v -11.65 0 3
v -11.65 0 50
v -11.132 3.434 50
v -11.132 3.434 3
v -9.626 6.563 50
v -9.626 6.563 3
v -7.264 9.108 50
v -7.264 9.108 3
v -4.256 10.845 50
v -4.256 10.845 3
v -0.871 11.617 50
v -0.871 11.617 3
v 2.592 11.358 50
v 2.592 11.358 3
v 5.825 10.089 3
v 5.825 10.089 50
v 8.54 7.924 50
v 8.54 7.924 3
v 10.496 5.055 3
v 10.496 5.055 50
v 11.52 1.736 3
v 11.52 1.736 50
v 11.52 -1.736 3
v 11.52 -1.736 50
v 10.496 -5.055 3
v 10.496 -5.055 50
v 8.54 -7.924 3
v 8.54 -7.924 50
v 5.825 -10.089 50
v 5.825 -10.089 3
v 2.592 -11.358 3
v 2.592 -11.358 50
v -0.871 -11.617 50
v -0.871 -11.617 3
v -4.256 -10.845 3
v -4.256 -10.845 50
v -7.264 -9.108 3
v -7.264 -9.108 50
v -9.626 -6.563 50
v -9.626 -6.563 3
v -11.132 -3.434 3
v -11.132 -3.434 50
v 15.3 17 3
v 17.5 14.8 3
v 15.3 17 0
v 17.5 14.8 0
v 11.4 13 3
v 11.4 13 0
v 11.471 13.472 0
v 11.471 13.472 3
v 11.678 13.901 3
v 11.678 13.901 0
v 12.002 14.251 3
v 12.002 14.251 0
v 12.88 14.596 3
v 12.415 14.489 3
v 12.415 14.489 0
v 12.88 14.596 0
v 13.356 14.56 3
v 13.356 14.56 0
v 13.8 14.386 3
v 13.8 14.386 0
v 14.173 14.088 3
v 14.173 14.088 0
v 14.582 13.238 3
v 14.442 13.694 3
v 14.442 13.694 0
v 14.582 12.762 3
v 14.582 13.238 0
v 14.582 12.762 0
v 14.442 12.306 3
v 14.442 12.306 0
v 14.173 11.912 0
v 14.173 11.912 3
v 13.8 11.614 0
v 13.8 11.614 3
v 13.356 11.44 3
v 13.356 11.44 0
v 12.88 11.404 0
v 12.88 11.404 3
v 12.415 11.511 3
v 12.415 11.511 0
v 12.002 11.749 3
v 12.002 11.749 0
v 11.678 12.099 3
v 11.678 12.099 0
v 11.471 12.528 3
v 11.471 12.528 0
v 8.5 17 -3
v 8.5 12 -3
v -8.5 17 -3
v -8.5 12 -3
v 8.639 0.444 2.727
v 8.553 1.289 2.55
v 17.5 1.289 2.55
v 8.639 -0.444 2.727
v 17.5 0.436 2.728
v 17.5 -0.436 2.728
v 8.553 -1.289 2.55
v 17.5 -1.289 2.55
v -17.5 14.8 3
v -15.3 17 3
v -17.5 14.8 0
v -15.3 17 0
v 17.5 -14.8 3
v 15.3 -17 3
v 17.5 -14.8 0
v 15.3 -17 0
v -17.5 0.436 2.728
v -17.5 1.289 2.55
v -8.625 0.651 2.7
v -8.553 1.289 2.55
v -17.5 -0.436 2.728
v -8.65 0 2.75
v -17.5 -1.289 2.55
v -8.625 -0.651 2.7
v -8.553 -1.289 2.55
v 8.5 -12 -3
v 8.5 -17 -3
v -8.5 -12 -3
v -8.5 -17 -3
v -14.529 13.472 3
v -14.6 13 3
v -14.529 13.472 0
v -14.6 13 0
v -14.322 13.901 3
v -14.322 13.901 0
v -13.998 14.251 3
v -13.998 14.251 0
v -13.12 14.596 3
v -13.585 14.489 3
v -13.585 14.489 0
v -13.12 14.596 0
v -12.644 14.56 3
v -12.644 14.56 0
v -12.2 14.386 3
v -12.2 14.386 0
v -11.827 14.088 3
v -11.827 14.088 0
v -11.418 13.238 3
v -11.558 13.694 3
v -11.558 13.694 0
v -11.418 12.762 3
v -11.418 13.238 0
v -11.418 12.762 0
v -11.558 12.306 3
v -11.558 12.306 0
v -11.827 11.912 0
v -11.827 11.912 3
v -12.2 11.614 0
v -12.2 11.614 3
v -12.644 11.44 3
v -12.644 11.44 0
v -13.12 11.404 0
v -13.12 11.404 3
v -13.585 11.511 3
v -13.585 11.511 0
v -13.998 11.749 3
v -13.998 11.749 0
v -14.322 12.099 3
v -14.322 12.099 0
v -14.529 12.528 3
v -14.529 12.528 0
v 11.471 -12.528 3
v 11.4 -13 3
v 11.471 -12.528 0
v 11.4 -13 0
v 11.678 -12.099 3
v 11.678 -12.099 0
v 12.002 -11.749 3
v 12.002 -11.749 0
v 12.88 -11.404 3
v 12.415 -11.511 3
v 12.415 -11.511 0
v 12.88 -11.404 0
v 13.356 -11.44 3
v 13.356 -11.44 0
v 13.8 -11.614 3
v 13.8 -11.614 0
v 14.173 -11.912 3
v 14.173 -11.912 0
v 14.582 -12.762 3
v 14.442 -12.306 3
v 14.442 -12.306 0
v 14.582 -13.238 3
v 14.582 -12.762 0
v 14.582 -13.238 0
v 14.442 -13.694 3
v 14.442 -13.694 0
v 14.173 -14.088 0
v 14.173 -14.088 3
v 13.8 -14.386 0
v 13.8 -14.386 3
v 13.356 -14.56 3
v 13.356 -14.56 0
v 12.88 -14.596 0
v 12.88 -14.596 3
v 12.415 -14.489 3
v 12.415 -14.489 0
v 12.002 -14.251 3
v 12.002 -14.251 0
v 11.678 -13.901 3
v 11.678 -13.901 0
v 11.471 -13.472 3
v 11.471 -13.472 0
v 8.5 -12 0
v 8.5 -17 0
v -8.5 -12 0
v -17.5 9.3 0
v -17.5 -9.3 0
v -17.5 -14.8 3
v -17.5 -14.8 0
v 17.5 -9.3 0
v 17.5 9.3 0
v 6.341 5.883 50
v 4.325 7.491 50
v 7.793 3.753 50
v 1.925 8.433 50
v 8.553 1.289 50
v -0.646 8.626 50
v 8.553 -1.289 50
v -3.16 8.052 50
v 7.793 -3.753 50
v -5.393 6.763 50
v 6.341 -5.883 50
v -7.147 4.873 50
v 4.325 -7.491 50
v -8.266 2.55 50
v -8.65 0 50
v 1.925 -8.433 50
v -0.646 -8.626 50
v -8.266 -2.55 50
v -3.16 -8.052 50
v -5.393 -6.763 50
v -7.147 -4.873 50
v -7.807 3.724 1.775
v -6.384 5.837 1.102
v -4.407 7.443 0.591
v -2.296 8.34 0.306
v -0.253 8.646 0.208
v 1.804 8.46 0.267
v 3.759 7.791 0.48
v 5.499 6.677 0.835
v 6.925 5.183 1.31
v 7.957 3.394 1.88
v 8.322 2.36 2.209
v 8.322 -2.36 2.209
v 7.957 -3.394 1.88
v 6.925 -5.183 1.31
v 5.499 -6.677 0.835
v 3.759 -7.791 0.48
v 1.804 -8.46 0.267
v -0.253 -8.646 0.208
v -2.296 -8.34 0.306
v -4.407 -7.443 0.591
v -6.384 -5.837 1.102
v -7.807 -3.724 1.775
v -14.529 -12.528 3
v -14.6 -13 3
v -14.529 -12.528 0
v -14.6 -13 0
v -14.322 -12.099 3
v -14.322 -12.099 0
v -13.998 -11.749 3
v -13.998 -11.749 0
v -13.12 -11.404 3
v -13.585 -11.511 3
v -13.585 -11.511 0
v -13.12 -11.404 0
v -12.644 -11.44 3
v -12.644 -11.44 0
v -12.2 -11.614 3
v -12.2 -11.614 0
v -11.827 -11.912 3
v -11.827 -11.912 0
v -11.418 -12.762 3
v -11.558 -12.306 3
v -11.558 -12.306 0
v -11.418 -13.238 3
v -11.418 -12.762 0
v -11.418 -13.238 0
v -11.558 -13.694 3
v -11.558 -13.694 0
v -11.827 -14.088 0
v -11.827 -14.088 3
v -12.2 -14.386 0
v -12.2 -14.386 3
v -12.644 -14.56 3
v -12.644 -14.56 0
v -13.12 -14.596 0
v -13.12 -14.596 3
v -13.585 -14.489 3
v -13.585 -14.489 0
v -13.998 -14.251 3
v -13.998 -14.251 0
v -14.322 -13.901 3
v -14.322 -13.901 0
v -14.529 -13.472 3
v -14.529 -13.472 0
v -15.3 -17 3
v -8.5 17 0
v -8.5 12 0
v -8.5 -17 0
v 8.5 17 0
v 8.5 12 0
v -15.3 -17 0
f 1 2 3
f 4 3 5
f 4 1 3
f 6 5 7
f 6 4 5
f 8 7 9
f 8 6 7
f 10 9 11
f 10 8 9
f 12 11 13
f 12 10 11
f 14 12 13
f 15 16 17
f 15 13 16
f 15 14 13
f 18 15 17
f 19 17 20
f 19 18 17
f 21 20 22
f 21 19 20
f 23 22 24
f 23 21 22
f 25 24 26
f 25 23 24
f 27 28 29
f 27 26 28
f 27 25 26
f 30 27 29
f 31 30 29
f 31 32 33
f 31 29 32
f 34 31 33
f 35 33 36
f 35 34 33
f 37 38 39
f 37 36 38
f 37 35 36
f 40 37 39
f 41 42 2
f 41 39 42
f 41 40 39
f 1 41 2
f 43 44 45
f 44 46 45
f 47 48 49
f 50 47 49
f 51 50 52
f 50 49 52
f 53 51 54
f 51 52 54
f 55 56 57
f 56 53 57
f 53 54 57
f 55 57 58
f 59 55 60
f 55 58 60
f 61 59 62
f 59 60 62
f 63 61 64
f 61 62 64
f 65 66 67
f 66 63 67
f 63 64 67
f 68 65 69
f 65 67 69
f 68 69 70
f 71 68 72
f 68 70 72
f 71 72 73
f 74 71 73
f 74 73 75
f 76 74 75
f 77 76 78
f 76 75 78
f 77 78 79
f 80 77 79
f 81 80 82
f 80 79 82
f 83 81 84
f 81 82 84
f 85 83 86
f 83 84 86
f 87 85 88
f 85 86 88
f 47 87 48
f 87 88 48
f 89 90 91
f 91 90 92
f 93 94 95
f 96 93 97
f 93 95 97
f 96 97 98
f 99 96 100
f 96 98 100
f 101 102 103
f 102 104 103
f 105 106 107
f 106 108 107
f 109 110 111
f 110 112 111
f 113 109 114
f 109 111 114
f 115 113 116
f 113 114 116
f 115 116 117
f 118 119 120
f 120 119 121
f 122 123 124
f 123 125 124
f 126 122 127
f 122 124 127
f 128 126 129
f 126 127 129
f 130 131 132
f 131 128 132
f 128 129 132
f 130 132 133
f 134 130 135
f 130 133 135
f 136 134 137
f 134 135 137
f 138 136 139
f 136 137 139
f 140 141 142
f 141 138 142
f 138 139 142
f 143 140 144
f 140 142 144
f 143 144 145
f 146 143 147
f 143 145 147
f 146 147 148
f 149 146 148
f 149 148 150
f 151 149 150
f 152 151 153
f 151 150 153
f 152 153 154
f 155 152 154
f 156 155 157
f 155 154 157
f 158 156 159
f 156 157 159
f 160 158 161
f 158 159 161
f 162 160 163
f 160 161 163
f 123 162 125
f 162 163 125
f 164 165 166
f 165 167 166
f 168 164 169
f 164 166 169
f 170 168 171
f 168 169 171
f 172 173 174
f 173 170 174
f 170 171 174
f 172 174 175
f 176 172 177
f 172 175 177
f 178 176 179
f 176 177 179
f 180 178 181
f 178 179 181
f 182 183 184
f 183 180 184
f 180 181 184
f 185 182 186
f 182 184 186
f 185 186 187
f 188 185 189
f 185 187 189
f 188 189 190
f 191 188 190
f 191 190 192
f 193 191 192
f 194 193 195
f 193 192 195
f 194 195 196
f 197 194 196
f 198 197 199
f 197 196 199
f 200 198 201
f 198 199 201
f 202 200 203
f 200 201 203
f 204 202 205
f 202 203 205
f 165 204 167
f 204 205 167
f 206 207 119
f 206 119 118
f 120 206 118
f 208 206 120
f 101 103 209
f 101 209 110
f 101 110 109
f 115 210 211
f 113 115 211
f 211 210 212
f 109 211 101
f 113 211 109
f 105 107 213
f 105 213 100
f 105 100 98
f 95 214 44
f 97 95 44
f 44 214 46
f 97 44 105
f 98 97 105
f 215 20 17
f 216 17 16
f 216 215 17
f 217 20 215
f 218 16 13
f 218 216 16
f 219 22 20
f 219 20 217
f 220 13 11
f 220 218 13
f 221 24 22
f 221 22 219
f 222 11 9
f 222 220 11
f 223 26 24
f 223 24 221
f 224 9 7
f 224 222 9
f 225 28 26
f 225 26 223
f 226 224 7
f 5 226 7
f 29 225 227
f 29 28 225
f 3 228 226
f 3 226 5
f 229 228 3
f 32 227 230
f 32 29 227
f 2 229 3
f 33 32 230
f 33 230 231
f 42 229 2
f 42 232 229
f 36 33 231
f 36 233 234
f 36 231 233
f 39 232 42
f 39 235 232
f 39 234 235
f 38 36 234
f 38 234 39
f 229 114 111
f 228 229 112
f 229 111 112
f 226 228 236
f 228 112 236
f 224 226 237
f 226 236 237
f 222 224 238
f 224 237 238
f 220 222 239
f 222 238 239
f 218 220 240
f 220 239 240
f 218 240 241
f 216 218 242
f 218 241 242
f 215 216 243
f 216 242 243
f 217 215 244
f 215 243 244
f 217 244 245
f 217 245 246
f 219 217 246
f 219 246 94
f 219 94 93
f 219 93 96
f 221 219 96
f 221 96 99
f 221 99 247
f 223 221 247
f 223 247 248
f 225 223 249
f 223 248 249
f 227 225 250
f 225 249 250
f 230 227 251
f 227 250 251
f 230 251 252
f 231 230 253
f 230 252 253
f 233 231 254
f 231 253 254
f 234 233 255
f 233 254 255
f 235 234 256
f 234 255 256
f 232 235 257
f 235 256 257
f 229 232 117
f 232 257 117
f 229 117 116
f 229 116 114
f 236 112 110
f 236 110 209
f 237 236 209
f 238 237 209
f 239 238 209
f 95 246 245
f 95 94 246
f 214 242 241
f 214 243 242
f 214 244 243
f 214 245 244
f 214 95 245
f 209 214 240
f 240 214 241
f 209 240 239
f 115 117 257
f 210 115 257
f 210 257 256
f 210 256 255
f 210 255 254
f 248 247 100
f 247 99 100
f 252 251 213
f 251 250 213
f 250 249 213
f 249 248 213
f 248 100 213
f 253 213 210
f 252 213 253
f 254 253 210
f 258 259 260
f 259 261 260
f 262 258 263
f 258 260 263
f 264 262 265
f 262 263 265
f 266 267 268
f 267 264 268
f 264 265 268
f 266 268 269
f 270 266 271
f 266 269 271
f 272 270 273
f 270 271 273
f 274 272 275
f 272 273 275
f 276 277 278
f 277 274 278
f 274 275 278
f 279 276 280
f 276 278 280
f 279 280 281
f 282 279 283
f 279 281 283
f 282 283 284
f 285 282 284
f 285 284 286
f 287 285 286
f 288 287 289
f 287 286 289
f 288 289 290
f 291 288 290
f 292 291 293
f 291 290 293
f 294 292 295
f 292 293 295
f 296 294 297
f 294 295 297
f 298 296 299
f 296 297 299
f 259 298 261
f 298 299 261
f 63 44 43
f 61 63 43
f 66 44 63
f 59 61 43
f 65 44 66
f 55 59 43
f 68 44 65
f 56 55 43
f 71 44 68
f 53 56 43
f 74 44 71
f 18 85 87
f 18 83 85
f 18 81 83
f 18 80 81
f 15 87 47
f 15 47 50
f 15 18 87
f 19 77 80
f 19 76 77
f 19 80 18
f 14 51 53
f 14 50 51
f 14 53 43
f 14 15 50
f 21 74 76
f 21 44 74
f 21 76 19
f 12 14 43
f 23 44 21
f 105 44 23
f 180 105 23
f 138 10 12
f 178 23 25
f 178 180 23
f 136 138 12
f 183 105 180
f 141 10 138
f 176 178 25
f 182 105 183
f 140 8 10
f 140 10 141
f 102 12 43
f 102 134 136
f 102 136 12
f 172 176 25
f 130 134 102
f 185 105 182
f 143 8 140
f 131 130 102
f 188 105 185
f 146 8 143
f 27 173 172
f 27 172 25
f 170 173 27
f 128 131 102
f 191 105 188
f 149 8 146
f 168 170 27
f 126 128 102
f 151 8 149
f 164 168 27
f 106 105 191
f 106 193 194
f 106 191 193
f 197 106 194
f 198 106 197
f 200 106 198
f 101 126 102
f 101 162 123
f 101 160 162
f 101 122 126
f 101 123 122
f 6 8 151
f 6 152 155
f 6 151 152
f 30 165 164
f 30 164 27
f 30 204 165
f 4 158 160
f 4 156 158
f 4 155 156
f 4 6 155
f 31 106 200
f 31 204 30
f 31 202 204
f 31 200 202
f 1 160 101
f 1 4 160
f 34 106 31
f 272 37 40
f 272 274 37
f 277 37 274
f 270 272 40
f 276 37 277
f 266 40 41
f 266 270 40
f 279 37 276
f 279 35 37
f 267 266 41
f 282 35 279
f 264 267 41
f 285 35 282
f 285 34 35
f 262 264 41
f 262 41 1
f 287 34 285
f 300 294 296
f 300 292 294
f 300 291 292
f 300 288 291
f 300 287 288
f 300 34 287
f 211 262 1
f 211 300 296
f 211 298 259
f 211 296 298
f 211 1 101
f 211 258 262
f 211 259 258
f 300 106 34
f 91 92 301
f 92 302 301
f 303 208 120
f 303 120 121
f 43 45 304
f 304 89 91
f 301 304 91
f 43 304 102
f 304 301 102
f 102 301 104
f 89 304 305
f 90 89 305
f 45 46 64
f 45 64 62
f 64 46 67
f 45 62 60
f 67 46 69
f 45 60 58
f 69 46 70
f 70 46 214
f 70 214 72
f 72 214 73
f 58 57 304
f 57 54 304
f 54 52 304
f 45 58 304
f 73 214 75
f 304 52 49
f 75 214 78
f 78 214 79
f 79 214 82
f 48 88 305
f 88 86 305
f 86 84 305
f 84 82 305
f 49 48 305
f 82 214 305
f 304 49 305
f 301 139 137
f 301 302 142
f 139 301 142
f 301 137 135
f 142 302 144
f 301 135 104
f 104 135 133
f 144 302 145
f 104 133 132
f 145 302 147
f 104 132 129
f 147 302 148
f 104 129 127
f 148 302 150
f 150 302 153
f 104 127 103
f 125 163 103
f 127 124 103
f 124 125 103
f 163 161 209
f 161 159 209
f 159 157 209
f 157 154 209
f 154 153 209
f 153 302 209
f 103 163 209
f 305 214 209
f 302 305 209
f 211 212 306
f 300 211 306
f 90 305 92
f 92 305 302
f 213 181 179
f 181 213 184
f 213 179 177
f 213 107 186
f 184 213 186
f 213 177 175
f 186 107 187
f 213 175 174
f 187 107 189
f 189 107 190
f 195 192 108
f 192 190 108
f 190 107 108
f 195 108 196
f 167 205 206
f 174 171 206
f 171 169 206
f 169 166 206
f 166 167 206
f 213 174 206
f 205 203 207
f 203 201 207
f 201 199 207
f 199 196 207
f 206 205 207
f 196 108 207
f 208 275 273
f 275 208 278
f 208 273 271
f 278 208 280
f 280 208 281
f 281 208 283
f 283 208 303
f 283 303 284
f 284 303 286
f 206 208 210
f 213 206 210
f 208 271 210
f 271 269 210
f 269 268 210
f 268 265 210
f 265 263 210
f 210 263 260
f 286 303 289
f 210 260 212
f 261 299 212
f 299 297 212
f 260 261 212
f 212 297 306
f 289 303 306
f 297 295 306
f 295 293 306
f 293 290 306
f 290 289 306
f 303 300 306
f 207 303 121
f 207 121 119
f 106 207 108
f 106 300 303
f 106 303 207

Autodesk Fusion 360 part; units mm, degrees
sketch "Sketch3" plane through (0, 0, 0) normal (0, 0, 1) x (-1, 0, 0)
  circle A0 centre (13, -13) radius 1
  circle A1 centre (13, 13) radius 1
  circle A2 centre (-13, 13) radius 1
  circle A3 centre (-13, -13) radius 1
  circle A4 centre (13, -13) radius 1.6
  circle A5 centre (13, 13) radius 1.6
  circle A6 centre (-13, 13) radius 1.6
  circle A7 centre (-13, -13) radius 1.6
  line L0 (17.5, -14.8) -> (17.5, 14.8)
  line L1 (17.5, 14.8) -> (15.3, 17)
  line L2 (15.3, 17) -> (-15.3, 17)
  line L3 (-15.3, 17) -> (-17.5, 14.8)
  line L4 (-17.5, 14.8) -> (-17.5, -14.8)
  line L5 (-17.5, -14.8) -> (-15.3, -17)
  line L6 (-15.3, -17) -> (15.3, -17)
  line L7 (15.3, -17) -> (17.5, -14.8)
  circle A8 centre (0, 0) radius 11.65
  circle A9 centre (0, 0) radius 8.65
  line L8 (8.5, 17) -> (-8.5, 17)
  line L9 (-8.5, 17) -> (-8.5, 12)
  line L10 (-8.5, 12) -> (8.5, 12)
  line L11 (8.5, 12) -> (8.5, 17)
  line L12 (8.5, -17) -> (-8.5, -17)
  line L13 (-8.5, -17) -> (-8.5, -12)
  line L14 (-8.5, -12) -> (8.5, -12)
  line L15 (8.5, -12) -> (8.5, -17)
  point P0 (17.5, -14.8)
  point P1 (15.3, -17)
  point P2 (17.5, 14.8)
  point P3 (15.3, 17)
  point P4 (-15.3, 17)
  point P5 (-17.5, 14.8)
  point P6 (-17.5, -14.8)
  point P7 (-15.3, -17)
  point P8 (-17.5, -8.8262)
  point P9 (-17.5, 8.8262)
  point P10 (-9, 17)
  point P11 (9, 17)
  point P12 (9, -17)
  point P13 (-9, -17)
  dimension "d26" = 3.2
  dimension "d27" = 3.2
  dimension "d28" = 3.2
  dimension "d29" = 3.2
  dimension "d30" = 23.3
  dimension "d31" = -3
  dimension "d38" = 5
  dimension "d39" = 0.5
  dimension "d40" = 0.5
  dimension "d41" = 0.5
  dimension "d42" = 5
  dimension "d43" = 0.5
extrude "Extrude6" add sketch "Sketch3" against normal blind 3 contours L6 L12 L13 L14 L15 | L2 L8 L9 L10 L11 makes body 1 at (2.8333, -15.3333, 0) makes body 2 at (-2.8333, 13.6667, 0)
extrude "Extrude3" add sketch "Sketch3" along normal blind 3 contours L0 L1 L2 L3 L4 L5 L6 L7 L9 L10 L11 L13 L14 L15 | L6 L12 L13 L14 L15 | L2 L8 L9 L10 L11 | A8 bodies 1 2
extrude "Extrude4" cut sketch "Sketch3" along normal blind 40 contours A8 bodies 1
extrude "Extrude5" add sketch "Sketch3" along normal blind 50 contours A8 bodies 1
sketch "Sketch4" plane through (17.5, 0, 0) normal (1, 0, 0) x (0, 1, 0)
  line L0 (-14.8, 0) -> (14.8, 0)
  line L1 (14.8, 0) -> (14.8, 3)
  line L2 (14.8, 3) -> (-14.8, 3)
  line L3 (-14.8, 3) -> (-14.8, 0)
  line L4 (1.289, 2.5498) -> (9.3, 0)
  line L5 (-1.289, 2.5498) -> (-9.3, 0)
  arc A0 (1.289, 2.5498) -> (-1.289, 2.5498) centre (0, -1.5) ccw
  line L6 (0, 0) -> (0, -1.5) construction
  dimension "d50" = 4.25
  dimension "d51" = 5.5
  dimension "d52" = 5.5
  dimension "d54" = 1.5
extrude "Extrude7" cut sketch "Sketch4" against normal through all contours L0 L4 L5 A0 bodies 1
